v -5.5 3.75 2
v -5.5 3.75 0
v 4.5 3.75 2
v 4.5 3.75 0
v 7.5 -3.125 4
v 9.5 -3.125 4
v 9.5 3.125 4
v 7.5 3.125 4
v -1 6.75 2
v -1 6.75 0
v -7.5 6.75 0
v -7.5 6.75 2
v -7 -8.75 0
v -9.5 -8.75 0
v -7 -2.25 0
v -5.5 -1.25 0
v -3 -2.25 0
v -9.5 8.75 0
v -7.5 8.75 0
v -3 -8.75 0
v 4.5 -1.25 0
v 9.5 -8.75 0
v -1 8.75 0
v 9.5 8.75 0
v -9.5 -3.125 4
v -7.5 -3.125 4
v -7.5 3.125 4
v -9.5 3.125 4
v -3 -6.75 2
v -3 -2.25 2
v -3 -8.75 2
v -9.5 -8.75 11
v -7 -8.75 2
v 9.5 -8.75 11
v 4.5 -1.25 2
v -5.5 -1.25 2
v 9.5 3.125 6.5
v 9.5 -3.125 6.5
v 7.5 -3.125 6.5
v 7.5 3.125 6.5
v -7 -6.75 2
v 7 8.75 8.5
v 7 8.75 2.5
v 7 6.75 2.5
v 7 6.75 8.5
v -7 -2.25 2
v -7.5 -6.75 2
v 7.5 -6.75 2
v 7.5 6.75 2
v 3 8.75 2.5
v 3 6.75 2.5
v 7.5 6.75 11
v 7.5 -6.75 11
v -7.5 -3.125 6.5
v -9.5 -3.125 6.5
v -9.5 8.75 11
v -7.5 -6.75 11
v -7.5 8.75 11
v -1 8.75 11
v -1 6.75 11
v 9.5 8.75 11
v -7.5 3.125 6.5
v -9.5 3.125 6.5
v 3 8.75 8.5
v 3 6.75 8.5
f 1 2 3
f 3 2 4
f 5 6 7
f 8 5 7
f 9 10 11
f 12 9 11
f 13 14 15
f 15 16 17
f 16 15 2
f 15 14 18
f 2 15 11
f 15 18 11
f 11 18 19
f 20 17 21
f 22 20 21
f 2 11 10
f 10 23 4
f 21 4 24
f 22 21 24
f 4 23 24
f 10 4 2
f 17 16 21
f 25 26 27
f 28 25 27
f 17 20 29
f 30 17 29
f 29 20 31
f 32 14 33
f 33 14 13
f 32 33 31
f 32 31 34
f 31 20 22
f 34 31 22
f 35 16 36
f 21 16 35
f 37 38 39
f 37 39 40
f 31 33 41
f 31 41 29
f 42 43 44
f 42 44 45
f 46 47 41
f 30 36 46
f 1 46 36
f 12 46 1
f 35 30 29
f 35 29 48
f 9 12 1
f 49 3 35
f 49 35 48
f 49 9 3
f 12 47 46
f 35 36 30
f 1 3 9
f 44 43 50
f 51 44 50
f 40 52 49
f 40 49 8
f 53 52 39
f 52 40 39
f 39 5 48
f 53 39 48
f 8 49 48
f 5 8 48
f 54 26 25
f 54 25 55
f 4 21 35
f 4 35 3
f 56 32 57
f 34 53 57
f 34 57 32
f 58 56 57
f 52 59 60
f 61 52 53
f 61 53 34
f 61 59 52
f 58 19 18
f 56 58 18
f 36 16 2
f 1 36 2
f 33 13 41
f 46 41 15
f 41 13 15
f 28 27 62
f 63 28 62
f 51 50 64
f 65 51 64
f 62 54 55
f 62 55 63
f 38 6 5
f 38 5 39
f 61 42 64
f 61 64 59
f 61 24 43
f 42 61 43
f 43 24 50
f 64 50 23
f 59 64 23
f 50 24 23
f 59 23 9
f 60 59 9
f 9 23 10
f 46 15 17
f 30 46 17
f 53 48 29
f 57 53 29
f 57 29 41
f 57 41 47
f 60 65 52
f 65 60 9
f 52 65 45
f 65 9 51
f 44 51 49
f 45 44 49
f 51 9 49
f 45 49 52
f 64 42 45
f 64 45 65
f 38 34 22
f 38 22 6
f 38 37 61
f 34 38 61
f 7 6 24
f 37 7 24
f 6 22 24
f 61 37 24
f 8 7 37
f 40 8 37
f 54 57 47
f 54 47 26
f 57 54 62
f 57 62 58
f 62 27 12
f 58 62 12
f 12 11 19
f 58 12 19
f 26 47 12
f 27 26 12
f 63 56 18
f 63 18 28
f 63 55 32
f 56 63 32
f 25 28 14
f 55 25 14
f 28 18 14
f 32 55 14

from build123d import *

# Parameters (mm, degrees)
F0_W     = 4
F0_H     = 4
F0_W_2   = 10
F0_H_2   = 5
F1_DEPTH = 2
F2_DEPTH = 11
F3_W     = 4
F3_H     = 6
F4_DEPTH = 2.9
F5_W     = 6.25
F5_H     = 2.5
F6_DEPTH = 20
F7_W     = 4
F7_H     = 2
F8_DEPTH = 2.8


with BuildPart() as f1:
    # F0 (on Top) → F1 (new body)
    with BuildSketch(Plane.XY):
        Polygon((-7.5, -6.75), (7.5, -6.75), (7.5, 6.75), (-1, 6.75), (-7.5, 6.75), align=None)
        with Locations((-5, -4.25)):
            Rectangle(F0_W, F0_H, mode=Mode.SUBTRACT)
        with Locations((-0.5, 1.25)):
            Rectangle(F0_W_2, F0_H_2, mode=Mode.SUBTRACT)
    extrude(amount=F1_DEPTH)

    # F0 (on Top) → F2 (join)
    with BuildSketch(Plane.XY):
        Polygon((7.5, 6.75), (7.5, -6.75), (-7.5, -6.75), (-7.5, 6.75), (-7.5, 8.75), (-9.5, 8.75), (-9.5, -8.75), (9.5, -8.75), (9.5, 8.75), (-1, 8.75), (-1, 6.75), align=None)
    extrude(amount=F2_DEPTH)

    # F3 (on face) → F4 (cut)
    with BuildSketch(Plane(origin=(0, 8.75, 0), x_dir=(-1, 0, 0), z_dir=(0, 1, 0))):
        with Locations((-5, 5.5)):
            Rectangle(F3_W, F3_H)
    extrude(amount=-F4_DEPTH, mode=Mode.SUBTRACT)

    # F5 (on face) → F6 (cut)
    with BuildSketch(Plane.YZ.offset(9.5)):
        with Locations((0, 5.25)):
            Rectangle(F5_W, F5_H)
    extrude(amount=-F6_DEPTH, mode=Mode.SUBTRACT)

    # F7 (on face) → F8 (cut)
    with BuildSketch(Plane.XZ.offset(8.75)):
        with Locations((-5, 1)):
            Rectangle(F7_W, F7_H)
    extrude(amount=-F8_DEPTH, mode=Mode.SUBTRACT)


solid = f1.part
